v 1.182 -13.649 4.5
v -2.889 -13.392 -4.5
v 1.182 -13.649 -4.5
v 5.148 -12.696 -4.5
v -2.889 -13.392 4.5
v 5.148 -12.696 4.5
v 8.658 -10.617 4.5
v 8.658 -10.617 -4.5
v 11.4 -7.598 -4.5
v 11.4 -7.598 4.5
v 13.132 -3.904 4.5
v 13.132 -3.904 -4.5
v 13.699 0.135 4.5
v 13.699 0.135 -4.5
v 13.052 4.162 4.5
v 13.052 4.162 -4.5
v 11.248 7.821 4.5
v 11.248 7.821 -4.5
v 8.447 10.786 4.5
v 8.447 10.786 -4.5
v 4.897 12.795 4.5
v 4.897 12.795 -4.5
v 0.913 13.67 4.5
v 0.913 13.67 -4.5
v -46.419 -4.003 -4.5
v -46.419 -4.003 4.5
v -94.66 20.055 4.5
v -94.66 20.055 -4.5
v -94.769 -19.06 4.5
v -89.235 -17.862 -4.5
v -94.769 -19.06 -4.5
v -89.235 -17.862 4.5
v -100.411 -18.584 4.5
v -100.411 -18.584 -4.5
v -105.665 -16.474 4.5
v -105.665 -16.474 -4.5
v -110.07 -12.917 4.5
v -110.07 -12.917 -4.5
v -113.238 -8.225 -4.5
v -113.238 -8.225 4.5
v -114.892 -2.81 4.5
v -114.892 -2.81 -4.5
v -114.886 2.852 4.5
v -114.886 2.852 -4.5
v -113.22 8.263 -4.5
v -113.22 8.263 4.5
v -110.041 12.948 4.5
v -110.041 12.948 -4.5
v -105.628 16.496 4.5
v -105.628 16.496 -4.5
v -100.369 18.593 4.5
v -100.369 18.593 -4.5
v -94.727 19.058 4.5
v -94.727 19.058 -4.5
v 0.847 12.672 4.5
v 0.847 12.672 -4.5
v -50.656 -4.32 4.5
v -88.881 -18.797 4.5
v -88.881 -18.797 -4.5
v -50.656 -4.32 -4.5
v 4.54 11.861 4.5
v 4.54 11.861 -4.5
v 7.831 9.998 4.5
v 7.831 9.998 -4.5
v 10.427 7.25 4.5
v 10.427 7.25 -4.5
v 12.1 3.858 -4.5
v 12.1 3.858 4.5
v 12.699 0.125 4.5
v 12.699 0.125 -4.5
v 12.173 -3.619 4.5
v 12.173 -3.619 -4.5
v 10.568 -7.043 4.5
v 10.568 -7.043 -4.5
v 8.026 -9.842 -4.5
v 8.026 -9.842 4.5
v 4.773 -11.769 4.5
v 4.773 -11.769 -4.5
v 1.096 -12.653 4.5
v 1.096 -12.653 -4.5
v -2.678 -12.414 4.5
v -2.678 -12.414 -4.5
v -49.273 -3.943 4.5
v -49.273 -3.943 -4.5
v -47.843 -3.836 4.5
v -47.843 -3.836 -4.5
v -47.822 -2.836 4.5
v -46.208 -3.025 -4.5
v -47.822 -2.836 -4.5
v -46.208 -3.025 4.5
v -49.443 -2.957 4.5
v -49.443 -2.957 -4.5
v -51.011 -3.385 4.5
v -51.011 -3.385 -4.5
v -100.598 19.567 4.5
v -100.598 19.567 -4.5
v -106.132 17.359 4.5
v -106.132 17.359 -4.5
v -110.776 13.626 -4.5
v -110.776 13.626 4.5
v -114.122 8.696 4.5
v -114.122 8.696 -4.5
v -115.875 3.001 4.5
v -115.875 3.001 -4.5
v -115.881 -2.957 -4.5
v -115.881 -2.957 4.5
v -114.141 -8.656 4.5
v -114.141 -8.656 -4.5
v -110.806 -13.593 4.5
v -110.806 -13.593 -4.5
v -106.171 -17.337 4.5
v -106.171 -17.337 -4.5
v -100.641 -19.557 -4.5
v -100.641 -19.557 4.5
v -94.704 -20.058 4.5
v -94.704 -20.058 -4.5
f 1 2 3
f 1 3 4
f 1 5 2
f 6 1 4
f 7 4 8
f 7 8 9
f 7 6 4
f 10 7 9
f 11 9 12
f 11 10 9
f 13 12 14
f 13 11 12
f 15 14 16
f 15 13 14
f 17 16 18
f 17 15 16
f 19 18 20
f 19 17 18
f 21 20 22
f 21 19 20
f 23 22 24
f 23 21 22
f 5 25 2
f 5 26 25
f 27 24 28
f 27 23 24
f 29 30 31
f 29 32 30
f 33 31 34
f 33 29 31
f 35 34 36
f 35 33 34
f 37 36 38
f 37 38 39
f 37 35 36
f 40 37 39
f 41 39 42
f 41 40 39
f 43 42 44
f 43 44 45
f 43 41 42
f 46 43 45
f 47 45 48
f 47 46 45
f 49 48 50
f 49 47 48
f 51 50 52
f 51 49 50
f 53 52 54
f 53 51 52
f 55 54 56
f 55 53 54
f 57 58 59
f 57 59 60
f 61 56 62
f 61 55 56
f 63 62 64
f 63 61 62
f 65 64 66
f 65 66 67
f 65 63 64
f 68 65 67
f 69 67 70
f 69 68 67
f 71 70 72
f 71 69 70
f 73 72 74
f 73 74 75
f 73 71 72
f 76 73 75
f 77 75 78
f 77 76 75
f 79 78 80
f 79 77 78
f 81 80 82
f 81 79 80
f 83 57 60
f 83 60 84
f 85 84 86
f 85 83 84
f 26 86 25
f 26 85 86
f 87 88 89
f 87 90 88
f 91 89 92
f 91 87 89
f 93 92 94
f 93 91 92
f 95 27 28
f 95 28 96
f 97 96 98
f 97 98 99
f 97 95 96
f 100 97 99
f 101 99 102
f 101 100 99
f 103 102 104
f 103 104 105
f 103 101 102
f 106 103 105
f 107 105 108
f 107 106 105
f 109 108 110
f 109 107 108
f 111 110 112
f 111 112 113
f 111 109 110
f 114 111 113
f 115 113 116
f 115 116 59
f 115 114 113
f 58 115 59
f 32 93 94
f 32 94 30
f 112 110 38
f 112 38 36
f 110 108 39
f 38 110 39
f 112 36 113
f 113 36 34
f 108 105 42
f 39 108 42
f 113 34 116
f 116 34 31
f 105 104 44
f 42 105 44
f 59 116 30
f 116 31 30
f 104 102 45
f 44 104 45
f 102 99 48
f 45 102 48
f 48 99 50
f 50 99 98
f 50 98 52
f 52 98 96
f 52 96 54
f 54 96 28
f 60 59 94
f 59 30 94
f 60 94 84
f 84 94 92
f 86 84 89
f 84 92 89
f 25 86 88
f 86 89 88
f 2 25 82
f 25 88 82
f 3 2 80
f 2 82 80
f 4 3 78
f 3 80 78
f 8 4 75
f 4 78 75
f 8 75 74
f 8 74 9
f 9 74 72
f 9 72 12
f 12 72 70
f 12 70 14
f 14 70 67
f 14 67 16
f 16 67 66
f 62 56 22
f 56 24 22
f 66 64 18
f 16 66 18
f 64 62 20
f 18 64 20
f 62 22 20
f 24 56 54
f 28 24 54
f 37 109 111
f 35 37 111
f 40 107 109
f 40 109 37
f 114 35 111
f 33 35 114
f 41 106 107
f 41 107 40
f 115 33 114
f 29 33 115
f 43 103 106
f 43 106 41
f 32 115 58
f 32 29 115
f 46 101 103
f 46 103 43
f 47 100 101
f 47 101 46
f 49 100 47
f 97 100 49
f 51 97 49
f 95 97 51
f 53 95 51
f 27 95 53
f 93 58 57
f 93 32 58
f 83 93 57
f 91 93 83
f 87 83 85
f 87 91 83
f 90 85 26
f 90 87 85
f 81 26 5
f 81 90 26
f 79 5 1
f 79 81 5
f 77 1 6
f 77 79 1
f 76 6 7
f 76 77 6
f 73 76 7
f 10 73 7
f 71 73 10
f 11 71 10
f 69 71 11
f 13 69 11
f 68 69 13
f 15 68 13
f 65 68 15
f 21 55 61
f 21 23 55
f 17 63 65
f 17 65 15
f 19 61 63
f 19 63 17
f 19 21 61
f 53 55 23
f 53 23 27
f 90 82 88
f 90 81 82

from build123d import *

# Parameters (mm, degrees)
BOSS_EXTRUDE1_DEPTH = 4.5


with BuildPart() as part:
    # Sketch1 → Boss-Extrude1 (new body, symmetric)
    with BuildSketch(Plane.XY):
        with BuildLine():
            Line((0.913333333, 13.669521653), (-94.66, 20.055283593))
            ThreePointArc((-94.66, 20.055283593), (-115.881273585, -2.957187963), (-88.88100799, -18.797072984))
            Line((-88.88100799, -18.797072984), (-50.656340302, -4.32029226))
            ThreePointArc((-50.656340302, -4.32029226), (-48.560454158, -3.855095369), (-46.418644181, -4.002733114))
            Line((-46.418644181, -4.002733114), (-2.888609962, -13.392010024))
            ThreePointArc((-2.888609962, -13.392010024), (13.566762828, -1.906028956), (0.913333333, 13.669521653))
        make_face()
        with BuildLine():
            Line((-51.010519009, -3.385114499), (-89.235186697, -17.861895224))
            ThreePointArc((-89.235186697, -17.861895224), (-114.892155496, -2.810064183), (-94.726666667, 19.05750829))
            Line((-94.726666667, 19.05750829), (0.846666667, 12.67174635))
            ThreePointArc((0.846666667, 12.67174635), (12.576488169, -1.766902755), (-2.67776252, -12.414491044))
            Line((-2.67776252, -12.414491044), (-46.207796739, -3.025214134))
            ThreePointArc((-46.207796739, -3.025214134), (-48.635181379, -2.857891357), (-51.010519009, -3.385114499))
        make_face(mode=Mode.SUBTRACT)
    extrude(amount=BOSS_EXTRUDE1_DEPTH, both=True)


solid = part.part
